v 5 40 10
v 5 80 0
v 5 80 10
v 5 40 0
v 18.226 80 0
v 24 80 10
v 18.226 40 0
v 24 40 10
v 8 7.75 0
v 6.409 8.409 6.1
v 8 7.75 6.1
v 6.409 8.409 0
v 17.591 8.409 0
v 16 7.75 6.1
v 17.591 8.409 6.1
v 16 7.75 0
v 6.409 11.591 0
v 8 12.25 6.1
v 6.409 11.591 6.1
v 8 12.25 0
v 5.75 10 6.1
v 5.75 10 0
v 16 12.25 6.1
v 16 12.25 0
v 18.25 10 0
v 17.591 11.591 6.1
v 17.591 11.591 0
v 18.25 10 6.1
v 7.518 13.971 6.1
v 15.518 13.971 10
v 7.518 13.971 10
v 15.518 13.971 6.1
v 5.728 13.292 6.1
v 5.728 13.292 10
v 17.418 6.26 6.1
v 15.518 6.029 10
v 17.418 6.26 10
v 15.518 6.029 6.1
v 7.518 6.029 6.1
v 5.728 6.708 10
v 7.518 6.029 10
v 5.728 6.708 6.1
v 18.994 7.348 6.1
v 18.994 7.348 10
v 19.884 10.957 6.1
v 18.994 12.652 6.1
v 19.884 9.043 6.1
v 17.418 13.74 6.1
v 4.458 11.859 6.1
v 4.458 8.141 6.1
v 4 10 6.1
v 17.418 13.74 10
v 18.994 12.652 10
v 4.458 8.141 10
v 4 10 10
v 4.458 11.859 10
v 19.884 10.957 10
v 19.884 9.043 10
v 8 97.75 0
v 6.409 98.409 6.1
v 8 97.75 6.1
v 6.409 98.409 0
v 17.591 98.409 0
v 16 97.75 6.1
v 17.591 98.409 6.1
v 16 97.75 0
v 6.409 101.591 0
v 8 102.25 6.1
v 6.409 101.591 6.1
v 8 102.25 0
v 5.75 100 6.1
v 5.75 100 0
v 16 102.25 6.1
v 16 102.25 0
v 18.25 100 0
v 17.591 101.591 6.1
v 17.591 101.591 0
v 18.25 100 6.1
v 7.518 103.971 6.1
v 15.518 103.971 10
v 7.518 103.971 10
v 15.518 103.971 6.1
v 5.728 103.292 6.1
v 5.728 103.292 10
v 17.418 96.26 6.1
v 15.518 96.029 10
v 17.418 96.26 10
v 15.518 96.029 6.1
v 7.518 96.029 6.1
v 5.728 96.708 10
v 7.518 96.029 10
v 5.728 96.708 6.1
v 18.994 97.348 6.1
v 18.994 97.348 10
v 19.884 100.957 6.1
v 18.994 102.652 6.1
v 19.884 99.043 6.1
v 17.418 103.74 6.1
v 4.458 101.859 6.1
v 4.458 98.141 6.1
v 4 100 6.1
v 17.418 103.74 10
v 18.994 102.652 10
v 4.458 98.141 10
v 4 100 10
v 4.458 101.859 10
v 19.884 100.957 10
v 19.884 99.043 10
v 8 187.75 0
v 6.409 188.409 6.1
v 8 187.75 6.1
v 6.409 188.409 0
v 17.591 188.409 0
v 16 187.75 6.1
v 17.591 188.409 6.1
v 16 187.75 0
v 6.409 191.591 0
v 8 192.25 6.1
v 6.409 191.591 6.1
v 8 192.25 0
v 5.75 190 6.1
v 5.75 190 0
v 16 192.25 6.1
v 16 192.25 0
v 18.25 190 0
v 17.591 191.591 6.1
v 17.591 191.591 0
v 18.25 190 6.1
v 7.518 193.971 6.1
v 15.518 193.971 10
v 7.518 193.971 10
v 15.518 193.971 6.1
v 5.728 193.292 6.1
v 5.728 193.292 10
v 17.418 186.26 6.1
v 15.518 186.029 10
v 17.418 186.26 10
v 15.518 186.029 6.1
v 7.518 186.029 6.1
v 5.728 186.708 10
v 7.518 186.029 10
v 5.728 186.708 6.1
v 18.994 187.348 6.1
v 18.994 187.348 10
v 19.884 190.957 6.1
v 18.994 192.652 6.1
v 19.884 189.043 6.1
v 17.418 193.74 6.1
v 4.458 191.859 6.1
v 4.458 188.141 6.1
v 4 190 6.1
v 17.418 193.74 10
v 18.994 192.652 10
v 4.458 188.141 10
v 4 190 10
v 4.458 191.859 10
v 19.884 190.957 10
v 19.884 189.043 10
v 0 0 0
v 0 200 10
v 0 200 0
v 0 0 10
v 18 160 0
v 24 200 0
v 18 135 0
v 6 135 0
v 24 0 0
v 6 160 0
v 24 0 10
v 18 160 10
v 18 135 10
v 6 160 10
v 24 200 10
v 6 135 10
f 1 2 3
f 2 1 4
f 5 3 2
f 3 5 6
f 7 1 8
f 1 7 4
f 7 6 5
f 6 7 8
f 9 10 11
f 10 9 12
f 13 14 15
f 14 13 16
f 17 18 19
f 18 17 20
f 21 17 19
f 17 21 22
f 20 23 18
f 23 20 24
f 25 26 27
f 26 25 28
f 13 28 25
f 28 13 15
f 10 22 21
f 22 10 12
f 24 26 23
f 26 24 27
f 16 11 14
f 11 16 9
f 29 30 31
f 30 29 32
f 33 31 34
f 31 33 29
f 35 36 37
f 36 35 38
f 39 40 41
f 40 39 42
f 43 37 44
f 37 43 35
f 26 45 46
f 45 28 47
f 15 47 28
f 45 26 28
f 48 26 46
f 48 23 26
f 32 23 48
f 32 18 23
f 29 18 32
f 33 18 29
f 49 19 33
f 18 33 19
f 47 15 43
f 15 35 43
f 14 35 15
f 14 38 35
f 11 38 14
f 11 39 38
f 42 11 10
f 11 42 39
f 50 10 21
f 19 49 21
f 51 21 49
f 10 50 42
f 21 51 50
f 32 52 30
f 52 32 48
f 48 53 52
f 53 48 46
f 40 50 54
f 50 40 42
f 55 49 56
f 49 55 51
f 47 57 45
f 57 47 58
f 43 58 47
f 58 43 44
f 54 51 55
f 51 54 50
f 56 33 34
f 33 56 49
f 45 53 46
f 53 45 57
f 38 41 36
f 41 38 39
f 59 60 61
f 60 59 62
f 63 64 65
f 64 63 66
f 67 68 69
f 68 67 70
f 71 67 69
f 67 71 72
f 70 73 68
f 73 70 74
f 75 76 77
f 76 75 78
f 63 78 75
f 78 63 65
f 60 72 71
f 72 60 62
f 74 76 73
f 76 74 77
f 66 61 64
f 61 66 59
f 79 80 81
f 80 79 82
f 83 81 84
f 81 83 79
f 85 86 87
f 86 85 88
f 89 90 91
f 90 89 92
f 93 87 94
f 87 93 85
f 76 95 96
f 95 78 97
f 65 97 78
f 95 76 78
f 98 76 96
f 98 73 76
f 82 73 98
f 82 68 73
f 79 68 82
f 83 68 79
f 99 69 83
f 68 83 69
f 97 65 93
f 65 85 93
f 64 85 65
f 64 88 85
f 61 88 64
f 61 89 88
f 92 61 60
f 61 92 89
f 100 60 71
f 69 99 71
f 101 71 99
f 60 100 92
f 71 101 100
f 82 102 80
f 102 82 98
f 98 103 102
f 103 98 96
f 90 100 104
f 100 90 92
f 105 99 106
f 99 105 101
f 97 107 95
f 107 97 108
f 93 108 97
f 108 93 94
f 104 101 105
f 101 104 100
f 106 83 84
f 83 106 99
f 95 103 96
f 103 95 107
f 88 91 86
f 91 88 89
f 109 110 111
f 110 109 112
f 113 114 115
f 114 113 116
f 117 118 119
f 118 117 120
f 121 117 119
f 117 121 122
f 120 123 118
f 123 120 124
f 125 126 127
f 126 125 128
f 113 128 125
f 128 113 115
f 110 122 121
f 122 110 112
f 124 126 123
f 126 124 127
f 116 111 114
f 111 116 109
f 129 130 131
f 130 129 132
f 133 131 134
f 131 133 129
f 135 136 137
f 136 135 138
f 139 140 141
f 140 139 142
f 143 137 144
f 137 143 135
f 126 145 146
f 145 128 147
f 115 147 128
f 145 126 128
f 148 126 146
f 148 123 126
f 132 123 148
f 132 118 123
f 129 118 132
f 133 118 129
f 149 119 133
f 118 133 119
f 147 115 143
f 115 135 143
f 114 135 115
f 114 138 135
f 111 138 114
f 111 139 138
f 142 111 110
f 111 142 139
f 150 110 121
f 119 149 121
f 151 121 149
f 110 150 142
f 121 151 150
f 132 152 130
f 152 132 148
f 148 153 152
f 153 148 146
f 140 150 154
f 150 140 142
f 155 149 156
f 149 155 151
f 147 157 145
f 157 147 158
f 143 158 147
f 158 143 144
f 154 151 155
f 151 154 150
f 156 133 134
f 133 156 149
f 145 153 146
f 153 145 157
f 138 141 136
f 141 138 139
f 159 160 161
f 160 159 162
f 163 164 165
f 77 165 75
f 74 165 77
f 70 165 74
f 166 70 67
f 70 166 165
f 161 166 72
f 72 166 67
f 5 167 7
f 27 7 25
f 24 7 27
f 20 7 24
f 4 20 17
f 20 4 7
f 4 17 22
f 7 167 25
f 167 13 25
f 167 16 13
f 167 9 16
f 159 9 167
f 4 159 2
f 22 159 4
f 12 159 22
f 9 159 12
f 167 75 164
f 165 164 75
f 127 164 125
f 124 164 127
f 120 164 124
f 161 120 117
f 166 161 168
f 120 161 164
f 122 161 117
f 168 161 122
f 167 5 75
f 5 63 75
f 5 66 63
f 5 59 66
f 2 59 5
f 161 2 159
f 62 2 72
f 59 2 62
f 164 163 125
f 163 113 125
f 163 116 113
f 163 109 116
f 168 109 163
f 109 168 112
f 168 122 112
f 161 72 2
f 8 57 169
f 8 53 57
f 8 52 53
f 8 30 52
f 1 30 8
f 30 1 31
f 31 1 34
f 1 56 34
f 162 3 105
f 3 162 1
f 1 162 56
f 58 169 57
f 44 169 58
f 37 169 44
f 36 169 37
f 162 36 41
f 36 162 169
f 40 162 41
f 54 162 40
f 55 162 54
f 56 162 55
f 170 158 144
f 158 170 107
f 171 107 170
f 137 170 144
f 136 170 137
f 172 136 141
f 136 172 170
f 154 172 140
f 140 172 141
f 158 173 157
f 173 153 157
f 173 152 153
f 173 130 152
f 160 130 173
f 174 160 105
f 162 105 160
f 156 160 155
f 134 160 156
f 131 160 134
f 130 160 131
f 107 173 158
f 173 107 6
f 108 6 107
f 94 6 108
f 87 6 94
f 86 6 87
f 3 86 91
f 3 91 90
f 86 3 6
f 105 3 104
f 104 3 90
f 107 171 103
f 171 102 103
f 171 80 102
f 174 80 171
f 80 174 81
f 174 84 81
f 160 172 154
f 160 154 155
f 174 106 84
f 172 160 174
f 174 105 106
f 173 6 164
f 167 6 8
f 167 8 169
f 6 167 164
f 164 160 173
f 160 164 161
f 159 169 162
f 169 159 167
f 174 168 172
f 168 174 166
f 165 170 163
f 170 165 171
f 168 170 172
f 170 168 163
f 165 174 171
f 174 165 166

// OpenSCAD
hoogte  = 200;
breedte =  24;
diepte  =  10;
meh     =   0.1;

dubbeledeur = true;

module schroefgat() {
    m = 4.5;
    kop = 8;
    x = 8;
    
    // Zijdelings verstelbaar
    hull() {
        translate([x, 0, -meh])         cylinder(d=m, h=10+2*meh);
        translate([breedte-x, 0, -meh]) cylinder(d=m, h=10+2*meh);
    }
    hull() {
        translate([x, 0, -meh])         cylinder(d=kop, h= 4);
        translate([breedte-x, 0, -meh]) cylinder(d=kop, h= 4);
    }
}

translate([breedte,0,diepte]) rotate([0,180,0]) difference() {
    cube([breedte,hoogte,diepte]);
    
    // dagschoot
    translate([6,hoogte-40-25,-meh]) cube([12,25,10+2*meh]);  
    
    // nachtschoot
    translate([7,40,-meh]) cube([10,40,10+2*meh]);
    
    if (dubbeledeur) {
        // nachtschoot moet kunnen uitdraaien draaien bij dubbele deur
        translate([7+2,40,-meh]) cube([10,40,10+2*meh]);
        rotate([0,30,0]) translate([0,40,-8]) cube([10,40,20+2*meh]);
    }
    
    // schroefgaten zitten al op vaste afstanden in de deur, dus niet parametrisch
    translate([0,  10, 0]) schroefgat();
    translate([0, 100, 0]) schroefgat();
    translate([0, 190, 0]) schroefgat();
}
